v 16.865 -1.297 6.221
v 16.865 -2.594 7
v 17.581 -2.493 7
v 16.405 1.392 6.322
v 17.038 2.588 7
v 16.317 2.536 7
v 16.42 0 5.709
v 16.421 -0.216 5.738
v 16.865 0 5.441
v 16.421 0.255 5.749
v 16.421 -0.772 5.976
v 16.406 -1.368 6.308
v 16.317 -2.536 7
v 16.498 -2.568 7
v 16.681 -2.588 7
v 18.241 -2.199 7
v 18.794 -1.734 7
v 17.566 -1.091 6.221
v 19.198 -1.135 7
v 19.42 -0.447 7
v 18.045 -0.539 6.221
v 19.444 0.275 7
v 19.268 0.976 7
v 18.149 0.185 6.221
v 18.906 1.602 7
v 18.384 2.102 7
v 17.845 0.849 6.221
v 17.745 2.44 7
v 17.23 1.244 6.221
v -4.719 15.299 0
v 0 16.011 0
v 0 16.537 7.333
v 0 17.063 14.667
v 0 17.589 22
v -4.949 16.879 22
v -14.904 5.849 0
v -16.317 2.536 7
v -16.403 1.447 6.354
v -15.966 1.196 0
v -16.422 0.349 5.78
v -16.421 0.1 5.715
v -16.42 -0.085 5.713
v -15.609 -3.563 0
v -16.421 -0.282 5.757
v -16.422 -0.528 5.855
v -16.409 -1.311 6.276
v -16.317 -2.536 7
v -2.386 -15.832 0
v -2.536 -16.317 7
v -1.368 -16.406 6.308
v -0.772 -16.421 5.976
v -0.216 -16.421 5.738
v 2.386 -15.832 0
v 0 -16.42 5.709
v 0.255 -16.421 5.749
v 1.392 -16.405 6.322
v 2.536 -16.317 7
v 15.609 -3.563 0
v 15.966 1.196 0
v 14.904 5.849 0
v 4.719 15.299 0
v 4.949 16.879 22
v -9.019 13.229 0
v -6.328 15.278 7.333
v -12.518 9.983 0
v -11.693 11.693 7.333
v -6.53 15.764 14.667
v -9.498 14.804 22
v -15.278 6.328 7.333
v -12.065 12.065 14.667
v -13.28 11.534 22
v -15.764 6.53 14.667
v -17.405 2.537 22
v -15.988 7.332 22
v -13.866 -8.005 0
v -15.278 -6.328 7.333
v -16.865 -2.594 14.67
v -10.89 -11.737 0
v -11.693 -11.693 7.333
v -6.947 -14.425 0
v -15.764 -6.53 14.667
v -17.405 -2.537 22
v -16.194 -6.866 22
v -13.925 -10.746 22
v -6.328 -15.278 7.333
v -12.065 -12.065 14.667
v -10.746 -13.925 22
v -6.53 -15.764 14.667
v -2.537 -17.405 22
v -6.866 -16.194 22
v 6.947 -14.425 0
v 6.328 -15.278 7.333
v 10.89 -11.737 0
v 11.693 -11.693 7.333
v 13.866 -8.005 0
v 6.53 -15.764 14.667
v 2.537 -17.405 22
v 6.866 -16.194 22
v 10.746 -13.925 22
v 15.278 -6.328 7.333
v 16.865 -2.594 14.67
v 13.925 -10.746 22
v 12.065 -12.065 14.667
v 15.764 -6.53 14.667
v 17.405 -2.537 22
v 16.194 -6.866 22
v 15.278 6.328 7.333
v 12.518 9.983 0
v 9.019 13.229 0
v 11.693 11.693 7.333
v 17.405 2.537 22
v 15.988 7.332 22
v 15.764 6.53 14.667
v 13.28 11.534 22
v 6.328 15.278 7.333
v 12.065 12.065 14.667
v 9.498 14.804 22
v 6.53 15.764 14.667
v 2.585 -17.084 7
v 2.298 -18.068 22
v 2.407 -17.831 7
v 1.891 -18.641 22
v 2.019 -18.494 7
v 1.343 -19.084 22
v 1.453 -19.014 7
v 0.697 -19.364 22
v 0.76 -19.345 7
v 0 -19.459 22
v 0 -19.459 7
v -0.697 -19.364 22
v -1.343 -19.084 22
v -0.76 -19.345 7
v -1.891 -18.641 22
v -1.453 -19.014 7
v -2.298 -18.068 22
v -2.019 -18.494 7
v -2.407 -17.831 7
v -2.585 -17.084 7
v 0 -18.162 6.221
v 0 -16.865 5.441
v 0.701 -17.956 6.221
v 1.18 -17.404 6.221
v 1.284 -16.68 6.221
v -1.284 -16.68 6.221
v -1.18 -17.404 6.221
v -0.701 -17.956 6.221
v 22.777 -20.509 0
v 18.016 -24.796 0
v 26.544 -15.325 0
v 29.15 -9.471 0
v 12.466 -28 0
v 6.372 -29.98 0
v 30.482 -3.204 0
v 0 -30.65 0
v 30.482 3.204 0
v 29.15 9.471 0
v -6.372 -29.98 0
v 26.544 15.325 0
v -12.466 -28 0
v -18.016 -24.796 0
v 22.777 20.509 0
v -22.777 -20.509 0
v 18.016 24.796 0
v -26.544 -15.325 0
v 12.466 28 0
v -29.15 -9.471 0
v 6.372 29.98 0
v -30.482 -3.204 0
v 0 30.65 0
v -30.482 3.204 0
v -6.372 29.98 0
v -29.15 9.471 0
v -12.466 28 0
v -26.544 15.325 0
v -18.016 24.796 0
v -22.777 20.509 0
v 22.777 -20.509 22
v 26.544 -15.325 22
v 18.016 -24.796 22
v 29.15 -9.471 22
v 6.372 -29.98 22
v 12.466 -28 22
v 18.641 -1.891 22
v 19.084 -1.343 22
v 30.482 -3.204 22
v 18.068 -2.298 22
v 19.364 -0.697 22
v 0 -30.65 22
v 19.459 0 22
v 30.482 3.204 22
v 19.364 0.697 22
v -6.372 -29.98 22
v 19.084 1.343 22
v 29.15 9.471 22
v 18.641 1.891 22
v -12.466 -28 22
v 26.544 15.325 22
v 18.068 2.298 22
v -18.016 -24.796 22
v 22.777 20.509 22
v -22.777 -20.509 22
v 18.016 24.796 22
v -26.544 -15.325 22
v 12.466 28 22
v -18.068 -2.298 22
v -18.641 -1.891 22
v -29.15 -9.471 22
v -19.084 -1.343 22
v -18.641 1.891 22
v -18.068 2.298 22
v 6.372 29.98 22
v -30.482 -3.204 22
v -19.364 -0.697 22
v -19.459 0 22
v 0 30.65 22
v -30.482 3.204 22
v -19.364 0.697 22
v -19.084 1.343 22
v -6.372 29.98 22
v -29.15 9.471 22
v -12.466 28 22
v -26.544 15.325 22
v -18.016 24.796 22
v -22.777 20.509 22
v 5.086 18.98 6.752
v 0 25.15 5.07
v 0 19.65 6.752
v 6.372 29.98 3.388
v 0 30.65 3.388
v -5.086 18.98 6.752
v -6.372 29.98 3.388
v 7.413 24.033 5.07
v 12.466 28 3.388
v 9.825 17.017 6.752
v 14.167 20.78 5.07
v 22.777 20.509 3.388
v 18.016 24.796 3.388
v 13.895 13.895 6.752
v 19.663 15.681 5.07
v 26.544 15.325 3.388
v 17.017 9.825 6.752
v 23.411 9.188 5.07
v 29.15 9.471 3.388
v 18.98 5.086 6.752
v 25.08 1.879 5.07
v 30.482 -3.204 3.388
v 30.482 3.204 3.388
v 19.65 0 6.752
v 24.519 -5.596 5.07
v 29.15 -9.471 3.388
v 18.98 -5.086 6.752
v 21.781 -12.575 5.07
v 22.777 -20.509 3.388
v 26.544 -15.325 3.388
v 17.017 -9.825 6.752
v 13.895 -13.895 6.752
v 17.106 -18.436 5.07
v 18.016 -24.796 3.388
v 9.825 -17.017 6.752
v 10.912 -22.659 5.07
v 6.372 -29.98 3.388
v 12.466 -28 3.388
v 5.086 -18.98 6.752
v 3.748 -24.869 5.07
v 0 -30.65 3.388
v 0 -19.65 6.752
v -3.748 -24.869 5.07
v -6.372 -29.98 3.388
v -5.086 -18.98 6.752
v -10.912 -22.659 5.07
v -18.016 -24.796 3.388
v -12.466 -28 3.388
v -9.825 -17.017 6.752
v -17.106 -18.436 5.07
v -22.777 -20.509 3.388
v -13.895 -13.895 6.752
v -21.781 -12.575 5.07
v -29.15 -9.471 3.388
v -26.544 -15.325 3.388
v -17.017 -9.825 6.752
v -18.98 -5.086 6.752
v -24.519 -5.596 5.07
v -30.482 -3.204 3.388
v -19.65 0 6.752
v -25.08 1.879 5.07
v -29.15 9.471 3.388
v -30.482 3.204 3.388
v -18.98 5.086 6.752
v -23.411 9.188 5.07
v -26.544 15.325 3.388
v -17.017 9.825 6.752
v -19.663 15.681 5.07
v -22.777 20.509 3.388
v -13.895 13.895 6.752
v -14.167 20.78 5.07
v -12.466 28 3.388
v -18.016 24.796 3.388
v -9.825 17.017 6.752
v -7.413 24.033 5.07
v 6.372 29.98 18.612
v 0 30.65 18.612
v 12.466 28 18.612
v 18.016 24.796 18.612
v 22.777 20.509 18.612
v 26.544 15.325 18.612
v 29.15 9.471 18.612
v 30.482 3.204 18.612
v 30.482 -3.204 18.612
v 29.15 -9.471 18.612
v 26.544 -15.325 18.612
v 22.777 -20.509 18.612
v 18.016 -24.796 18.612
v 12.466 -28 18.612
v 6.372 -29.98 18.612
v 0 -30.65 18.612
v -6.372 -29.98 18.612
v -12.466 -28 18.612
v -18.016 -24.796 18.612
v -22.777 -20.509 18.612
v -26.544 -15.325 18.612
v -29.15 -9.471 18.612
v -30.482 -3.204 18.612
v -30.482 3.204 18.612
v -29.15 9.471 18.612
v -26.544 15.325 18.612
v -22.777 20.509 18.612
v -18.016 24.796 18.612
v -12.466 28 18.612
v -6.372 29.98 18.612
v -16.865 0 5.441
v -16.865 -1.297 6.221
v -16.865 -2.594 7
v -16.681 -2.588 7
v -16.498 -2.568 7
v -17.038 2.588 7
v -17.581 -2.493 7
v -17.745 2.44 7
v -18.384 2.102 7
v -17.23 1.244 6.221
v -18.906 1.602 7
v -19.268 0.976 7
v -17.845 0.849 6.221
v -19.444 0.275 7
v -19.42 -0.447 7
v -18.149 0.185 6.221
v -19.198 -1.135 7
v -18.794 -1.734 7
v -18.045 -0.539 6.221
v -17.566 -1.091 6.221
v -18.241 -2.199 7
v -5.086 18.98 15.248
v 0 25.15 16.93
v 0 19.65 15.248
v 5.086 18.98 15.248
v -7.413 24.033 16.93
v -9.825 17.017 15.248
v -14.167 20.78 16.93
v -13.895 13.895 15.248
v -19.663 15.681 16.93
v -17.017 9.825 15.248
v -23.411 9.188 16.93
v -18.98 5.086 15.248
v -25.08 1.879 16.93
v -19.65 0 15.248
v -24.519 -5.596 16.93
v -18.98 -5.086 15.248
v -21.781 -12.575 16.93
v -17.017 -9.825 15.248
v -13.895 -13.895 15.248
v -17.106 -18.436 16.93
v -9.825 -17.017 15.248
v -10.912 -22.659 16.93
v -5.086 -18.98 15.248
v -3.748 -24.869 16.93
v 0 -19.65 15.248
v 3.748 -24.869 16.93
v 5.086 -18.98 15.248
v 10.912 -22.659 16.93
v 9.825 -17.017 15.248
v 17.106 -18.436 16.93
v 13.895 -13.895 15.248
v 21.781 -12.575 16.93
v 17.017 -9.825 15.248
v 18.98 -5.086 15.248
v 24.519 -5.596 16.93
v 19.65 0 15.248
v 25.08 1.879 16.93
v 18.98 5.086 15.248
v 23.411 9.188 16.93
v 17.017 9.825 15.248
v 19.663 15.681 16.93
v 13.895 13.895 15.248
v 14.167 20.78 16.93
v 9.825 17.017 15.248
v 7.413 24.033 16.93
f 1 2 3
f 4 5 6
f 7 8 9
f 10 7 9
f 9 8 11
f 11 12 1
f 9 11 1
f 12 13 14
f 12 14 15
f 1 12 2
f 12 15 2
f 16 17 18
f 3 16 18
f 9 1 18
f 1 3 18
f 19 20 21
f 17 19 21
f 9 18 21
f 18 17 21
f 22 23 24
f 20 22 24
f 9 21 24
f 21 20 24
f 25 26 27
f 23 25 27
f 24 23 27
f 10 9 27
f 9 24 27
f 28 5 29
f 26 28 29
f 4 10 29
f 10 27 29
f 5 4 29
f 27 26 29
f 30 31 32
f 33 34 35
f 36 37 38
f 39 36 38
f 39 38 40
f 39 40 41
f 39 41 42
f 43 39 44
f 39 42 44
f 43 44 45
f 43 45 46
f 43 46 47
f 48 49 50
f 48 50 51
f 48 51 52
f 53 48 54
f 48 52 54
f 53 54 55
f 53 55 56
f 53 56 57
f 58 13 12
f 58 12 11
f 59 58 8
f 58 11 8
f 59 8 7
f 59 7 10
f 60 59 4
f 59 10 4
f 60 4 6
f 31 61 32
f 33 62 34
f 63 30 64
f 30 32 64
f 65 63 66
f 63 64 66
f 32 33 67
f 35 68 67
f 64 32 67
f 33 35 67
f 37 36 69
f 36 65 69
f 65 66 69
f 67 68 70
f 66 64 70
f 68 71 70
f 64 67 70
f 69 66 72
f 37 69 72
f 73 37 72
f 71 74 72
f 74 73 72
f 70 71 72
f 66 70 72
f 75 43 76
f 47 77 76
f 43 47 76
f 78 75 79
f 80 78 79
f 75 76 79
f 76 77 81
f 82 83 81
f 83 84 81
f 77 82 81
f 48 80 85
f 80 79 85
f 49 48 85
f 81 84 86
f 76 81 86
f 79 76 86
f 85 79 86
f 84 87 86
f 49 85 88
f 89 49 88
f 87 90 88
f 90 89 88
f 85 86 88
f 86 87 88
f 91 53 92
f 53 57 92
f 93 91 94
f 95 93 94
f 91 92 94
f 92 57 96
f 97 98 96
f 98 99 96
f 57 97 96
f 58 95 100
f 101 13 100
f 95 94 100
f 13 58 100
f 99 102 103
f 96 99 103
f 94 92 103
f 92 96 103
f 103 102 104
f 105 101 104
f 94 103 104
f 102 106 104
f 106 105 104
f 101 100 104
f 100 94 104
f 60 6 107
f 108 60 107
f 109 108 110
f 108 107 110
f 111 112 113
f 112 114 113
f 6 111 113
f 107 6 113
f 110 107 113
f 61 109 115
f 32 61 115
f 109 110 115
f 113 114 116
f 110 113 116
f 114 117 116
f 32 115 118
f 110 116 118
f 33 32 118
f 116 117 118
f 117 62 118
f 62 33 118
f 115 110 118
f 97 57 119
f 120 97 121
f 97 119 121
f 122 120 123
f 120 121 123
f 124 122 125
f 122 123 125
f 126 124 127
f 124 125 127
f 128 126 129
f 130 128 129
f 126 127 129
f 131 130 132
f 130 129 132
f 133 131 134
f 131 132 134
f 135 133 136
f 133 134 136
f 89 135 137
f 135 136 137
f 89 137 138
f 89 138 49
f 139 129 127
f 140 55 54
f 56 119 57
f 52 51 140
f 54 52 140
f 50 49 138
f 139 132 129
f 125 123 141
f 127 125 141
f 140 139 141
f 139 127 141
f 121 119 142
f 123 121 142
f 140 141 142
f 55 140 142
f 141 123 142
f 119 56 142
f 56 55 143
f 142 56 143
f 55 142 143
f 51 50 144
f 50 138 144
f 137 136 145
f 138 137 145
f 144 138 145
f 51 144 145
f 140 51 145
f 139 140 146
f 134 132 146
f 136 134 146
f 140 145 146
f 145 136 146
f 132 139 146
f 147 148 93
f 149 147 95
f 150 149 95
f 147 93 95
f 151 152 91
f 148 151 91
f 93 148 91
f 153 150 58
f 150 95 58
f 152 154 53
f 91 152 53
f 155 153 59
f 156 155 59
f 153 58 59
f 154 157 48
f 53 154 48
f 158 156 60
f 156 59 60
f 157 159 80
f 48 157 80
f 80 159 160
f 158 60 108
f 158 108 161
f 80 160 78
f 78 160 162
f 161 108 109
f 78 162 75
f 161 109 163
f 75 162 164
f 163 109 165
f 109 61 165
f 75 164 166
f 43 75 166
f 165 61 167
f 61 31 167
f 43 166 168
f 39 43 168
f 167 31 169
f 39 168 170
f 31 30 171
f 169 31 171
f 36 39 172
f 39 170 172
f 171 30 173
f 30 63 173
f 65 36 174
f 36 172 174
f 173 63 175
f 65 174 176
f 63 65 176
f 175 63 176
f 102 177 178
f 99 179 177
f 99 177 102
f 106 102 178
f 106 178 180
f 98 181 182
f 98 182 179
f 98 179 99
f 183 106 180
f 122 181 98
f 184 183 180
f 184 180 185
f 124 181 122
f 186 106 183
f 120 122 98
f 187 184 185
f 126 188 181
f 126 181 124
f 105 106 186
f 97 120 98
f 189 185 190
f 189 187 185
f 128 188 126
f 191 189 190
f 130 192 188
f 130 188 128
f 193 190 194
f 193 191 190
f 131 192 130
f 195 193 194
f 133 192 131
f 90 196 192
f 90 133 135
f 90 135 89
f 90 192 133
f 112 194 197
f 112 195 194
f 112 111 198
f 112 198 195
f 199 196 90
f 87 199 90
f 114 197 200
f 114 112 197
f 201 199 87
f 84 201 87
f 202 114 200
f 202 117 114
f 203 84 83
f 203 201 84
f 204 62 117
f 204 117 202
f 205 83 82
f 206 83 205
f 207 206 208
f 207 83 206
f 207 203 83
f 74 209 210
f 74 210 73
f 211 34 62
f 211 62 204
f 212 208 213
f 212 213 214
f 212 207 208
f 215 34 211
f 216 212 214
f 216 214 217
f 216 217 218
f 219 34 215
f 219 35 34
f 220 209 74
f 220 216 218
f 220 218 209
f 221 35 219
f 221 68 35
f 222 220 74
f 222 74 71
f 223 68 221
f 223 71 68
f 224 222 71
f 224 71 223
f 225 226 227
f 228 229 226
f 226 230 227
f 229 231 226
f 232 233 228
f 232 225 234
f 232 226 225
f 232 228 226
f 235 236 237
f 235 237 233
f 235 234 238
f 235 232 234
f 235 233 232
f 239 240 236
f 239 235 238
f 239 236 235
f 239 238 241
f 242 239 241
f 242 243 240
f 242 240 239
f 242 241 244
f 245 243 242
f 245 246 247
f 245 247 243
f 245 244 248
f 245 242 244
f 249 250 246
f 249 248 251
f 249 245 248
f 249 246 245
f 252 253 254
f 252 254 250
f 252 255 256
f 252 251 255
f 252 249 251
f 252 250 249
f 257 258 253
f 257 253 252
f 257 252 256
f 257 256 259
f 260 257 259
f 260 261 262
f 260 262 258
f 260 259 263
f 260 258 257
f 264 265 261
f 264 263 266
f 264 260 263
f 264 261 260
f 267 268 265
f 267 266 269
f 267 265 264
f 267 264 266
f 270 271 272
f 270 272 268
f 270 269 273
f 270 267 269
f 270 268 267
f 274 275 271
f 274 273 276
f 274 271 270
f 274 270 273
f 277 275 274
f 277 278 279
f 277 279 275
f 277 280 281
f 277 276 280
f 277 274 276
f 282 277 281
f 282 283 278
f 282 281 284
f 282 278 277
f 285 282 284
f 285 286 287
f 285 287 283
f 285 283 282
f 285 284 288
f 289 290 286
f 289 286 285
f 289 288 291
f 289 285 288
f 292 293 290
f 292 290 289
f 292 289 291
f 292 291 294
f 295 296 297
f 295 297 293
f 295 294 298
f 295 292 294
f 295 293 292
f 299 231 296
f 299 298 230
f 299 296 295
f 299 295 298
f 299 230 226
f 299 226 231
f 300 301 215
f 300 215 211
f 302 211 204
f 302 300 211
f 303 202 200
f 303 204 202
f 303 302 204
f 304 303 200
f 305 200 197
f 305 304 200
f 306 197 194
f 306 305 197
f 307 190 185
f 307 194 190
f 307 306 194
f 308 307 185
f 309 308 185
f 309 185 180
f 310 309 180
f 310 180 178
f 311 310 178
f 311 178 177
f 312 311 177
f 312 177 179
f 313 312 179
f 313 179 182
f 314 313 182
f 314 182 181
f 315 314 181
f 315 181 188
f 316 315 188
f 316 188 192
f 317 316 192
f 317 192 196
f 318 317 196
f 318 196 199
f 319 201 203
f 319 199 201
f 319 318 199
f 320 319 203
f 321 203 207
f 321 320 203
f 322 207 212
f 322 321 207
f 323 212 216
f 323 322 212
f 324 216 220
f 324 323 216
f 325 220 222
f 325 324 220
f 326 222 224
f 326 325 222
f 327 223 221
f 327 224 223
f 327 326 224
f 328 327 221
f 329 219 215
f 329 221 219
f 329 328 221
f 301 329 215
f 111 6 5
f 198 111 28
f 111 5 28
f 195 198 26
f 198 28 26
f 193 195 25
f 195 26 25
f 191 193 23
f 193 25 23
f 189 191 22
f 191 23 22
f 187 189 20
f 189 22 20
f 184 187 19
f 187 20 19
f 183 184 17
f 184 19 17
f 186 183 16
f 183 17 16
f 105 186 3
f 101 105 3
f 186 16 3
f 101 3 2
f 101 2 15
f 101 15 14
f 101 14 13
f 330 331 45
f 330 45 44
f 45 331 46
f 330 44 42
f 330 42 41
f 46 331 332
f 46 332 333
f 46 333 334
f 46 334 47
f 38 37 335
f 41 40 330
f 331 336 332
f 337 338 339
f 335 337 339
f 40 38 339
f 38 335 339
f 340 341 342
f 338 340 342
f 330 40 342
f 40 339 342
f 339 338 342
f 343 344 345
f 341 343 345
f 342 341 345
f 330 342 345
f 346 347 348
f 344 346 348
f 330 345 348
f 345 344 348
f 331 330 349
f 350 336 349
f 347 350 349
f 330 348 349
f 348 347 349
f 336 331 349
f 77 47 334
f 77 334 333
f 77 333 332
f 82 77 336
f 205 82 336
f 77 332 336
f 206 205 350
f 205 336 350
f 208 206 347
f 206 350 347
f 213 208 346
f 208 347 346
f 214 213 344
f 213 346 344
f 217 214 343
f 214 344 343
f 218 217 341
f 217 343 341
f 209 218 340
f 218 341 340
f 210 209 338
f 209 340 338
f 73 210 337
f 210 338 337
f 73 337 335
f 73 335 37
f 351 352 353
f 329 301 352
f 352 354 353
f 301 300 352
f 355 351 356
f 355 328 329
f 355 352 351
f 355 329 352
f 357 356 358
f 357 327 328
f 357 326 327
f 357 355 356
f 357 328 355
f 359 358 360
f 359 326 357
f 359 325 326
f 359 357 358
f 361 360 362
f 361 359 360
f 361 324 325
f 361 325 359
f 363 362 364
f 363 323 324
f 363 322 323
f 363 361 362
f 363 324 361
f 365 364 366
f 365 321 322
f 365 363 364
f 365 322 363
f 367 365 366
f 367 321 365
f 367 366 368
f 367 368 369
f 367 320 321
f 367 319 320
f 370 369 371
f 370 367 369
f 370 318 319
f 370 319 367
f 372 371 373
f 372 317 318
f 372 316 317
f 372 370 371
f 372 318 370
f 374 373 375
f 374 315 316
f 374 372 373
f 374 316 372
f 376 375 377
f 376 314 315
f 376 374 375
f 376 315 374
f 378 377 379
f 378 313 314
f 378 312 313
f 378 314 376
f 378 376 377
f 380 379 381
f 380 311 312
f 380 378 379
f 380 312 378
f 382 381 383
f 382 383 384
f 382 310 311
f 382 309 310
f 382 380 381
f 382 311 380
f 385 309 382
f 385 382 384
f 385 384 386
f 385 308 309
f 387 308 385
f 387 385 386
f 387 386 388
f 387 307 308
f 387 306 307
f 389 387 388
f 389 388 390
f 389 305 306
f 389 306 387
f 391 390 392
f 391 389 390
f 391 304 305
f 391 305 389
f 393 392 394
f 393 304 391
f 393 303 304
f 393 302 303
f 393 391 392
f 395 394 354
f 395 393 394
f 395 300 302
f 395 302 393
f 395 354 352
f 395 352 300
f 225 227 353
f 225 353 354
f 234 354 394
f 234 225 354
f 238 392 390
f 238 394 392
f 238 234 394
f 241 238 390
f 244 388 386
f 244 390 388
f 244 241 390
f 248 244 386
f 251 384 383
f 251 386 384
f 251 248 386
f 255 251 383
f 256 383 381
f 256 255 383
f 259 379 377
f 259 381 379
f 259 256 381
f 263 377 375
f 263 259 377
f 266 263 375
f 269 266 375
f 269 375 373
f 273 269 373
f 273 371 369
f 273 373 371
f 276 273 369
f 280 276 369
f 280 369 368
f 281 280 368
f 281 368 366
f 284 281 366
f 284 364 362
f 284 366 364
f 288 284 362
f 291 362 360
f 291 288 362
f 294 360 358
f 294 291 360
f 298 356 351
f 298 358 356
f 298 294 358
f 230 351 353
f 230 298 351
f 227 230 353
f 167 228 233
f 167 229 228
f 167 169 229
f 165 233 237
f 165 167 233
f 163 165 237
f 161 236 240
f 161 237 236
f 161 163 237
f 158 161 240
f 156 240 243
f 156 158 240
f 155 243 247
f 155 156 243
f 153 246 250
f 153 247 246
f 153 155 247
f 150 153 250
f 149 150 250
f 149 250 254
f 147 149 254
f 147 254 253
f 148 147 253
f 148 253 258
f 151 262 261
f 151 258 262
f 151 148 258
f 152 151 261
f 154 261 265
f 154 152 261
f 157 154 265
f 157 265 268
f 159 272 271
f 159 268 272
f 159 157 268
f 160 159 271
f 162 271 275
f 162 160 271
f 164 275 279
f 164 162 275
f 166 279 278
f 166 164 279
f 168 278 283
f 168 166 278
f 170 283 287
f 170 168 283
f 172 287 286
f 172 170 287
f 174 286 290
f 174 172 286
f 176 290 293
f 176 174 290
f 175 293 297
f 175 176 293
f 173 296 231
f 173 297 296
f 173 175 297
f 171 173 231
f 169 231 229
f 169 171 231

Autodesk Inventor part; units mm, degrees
ref_plane "YZ Plane" through (0, 0, 0) normal (1, 0, 0) x (0, 1, 0)
ref_plane "XZ Plane" through (0, 0, 0) normal (0, 1, 0) x (-1, 0, 0)
sketch "Esquisse principale" plane through (0, 0, 0) normal (1, 0, 0) x (0, 1, 0)
  line L0 (0, 22) -> (30.65, 22)
  line L1 (30.65, 22) -> (30.65, 18.6115)
  line L2 (30.65, 18.6115) -> (19.65, 15.2484)
  line L3 (19.65, 15.2484) -> (19.65, 6.7516)
  line L4 (19.65, 6.7516) -> (30.65, 3.3885)
  line L5 (30.65, 3.3885) -> (30.65, 0)
  line L6 (30.65, 0) -> (0, 0)
  line L7 (28.65, 18) -> (28.65, 4) construction
  line L8 (19.65, 11) -> (28.65, 11) construction
  line L9 (30.65, 18.6115) -> (30.65, 3.3885)
  line L10 (0, -4.4) -> (0, 26.4) projected
  line L11 (0, 0) -> (0, 22)
  dimension "d0" = 14
  dimension "d1" = 34
  dimension "d2" = 2
  dimension "d6" = 22
  dimension "d21" = 57.3
  dimension "d25" = 11
  dimension "d27" = 11
ref_plane "Plan de courroie" through (0, 19.65, 11) normal (0, 0, 1) x (1, 0, 0)
revolve "Corps" add sketch "Esquisse principale" angle 360 about axis through (0, 0, -10) along (0, 0, 1)
revolve "Bord" cut sketch "Esquisse principale" angle 360 about axis through (0, 0, -10) along (0, 0, 1) contours L9 L4 L3 L2
fillet "Congé externe" [suppressed]
fillet "Congé interne" [suppressed]
pattern_of_one "Réseau de bords"
sketch "Esquisse5" plane through (0, 0, 0) normal (1, 0, 0) x (0, 1, 0)
  line L0 (0, -3.4128) -> (0, 36.612)
  line L1 (-30.65, 22) -> (30.65, 22) projected
  line L2 (0, 22.15) -> (17.6, 22.15)
  line L3 (0, -0.15) -> (16, -0.15)
  line L4 (16, -0.15) -> (17.6, 22.15)
  line L5 (-30.65, 0) -> (30.65, 0) projected
  point P0 (0, 0)
  point P1 (0, 0)
  point P2 (16.0108, 0)
  point P3 (17.5892, 22)
  point P4 (0, 22)
  dimension "d42" = 17.6
  dimension "d43" = 16
  dimension "d44" = 22.3
  dimension "d45" = 0.15
revolve "Révolution4" cut sketch "Esquisse5" angle 360 about axis through (0, 0, -3.4128) along (0, 0, 1) contours L0 L1 L4 L5
sketch "Esquisse6" plane through (0, 0, 22) normal (0, 0, 1) x (1, 0, 0)
  circle A0 centre (0, 0) radius 16.865
  line L0 (0, 0) -> (0, -20.3101)
  line L1 (0, 0) -> (20.7504, 0)
  line L2 (0, 0) -> (-20.5452, 0)
  point P0 (0, -16.865)
  point P1 (-16.865, 0)
  point P2 (16.865, 0)
  dimension "d54" = 33.73
hole "Perçage2" at (0, -16.865, 22) at (-16.865, 0, 22) at (16.865, 0, 22) direction (0, 0, -1) diameter 5.1881 depth 15 tip angle 118 thread size "M6x0.75" class "6H" standard "ANSI Metric M Profile"
equation "\"d0\" = da_Bw"
equation "\"d1\" = da_Alfa"
equation "\"d2\" = da_c"
equation "\"d21\" = da_Dw"
equation "\"d25\" = da_Hd"
equation "\"d27\" = da_Se"
equation "\"da_r1\" = 0"
equation "\"da_r2\" = 0"
equation "\"d18\" = da_Sg"
equation "\"d5\" = da_Se"
equation "\"da_Bw\" = 14"
equation "\"da_Alfa\" = 34deg"
equation "\"da_c\" = 2"
equation "\"da_Dw\" = 57.3"
equation "\"da_Hd\" = 11"
equation "\"da_Se\" = 11"
equation "\"da_Sg\" = 12"
properties part number "Poulie à gorge2" material "Steel"
